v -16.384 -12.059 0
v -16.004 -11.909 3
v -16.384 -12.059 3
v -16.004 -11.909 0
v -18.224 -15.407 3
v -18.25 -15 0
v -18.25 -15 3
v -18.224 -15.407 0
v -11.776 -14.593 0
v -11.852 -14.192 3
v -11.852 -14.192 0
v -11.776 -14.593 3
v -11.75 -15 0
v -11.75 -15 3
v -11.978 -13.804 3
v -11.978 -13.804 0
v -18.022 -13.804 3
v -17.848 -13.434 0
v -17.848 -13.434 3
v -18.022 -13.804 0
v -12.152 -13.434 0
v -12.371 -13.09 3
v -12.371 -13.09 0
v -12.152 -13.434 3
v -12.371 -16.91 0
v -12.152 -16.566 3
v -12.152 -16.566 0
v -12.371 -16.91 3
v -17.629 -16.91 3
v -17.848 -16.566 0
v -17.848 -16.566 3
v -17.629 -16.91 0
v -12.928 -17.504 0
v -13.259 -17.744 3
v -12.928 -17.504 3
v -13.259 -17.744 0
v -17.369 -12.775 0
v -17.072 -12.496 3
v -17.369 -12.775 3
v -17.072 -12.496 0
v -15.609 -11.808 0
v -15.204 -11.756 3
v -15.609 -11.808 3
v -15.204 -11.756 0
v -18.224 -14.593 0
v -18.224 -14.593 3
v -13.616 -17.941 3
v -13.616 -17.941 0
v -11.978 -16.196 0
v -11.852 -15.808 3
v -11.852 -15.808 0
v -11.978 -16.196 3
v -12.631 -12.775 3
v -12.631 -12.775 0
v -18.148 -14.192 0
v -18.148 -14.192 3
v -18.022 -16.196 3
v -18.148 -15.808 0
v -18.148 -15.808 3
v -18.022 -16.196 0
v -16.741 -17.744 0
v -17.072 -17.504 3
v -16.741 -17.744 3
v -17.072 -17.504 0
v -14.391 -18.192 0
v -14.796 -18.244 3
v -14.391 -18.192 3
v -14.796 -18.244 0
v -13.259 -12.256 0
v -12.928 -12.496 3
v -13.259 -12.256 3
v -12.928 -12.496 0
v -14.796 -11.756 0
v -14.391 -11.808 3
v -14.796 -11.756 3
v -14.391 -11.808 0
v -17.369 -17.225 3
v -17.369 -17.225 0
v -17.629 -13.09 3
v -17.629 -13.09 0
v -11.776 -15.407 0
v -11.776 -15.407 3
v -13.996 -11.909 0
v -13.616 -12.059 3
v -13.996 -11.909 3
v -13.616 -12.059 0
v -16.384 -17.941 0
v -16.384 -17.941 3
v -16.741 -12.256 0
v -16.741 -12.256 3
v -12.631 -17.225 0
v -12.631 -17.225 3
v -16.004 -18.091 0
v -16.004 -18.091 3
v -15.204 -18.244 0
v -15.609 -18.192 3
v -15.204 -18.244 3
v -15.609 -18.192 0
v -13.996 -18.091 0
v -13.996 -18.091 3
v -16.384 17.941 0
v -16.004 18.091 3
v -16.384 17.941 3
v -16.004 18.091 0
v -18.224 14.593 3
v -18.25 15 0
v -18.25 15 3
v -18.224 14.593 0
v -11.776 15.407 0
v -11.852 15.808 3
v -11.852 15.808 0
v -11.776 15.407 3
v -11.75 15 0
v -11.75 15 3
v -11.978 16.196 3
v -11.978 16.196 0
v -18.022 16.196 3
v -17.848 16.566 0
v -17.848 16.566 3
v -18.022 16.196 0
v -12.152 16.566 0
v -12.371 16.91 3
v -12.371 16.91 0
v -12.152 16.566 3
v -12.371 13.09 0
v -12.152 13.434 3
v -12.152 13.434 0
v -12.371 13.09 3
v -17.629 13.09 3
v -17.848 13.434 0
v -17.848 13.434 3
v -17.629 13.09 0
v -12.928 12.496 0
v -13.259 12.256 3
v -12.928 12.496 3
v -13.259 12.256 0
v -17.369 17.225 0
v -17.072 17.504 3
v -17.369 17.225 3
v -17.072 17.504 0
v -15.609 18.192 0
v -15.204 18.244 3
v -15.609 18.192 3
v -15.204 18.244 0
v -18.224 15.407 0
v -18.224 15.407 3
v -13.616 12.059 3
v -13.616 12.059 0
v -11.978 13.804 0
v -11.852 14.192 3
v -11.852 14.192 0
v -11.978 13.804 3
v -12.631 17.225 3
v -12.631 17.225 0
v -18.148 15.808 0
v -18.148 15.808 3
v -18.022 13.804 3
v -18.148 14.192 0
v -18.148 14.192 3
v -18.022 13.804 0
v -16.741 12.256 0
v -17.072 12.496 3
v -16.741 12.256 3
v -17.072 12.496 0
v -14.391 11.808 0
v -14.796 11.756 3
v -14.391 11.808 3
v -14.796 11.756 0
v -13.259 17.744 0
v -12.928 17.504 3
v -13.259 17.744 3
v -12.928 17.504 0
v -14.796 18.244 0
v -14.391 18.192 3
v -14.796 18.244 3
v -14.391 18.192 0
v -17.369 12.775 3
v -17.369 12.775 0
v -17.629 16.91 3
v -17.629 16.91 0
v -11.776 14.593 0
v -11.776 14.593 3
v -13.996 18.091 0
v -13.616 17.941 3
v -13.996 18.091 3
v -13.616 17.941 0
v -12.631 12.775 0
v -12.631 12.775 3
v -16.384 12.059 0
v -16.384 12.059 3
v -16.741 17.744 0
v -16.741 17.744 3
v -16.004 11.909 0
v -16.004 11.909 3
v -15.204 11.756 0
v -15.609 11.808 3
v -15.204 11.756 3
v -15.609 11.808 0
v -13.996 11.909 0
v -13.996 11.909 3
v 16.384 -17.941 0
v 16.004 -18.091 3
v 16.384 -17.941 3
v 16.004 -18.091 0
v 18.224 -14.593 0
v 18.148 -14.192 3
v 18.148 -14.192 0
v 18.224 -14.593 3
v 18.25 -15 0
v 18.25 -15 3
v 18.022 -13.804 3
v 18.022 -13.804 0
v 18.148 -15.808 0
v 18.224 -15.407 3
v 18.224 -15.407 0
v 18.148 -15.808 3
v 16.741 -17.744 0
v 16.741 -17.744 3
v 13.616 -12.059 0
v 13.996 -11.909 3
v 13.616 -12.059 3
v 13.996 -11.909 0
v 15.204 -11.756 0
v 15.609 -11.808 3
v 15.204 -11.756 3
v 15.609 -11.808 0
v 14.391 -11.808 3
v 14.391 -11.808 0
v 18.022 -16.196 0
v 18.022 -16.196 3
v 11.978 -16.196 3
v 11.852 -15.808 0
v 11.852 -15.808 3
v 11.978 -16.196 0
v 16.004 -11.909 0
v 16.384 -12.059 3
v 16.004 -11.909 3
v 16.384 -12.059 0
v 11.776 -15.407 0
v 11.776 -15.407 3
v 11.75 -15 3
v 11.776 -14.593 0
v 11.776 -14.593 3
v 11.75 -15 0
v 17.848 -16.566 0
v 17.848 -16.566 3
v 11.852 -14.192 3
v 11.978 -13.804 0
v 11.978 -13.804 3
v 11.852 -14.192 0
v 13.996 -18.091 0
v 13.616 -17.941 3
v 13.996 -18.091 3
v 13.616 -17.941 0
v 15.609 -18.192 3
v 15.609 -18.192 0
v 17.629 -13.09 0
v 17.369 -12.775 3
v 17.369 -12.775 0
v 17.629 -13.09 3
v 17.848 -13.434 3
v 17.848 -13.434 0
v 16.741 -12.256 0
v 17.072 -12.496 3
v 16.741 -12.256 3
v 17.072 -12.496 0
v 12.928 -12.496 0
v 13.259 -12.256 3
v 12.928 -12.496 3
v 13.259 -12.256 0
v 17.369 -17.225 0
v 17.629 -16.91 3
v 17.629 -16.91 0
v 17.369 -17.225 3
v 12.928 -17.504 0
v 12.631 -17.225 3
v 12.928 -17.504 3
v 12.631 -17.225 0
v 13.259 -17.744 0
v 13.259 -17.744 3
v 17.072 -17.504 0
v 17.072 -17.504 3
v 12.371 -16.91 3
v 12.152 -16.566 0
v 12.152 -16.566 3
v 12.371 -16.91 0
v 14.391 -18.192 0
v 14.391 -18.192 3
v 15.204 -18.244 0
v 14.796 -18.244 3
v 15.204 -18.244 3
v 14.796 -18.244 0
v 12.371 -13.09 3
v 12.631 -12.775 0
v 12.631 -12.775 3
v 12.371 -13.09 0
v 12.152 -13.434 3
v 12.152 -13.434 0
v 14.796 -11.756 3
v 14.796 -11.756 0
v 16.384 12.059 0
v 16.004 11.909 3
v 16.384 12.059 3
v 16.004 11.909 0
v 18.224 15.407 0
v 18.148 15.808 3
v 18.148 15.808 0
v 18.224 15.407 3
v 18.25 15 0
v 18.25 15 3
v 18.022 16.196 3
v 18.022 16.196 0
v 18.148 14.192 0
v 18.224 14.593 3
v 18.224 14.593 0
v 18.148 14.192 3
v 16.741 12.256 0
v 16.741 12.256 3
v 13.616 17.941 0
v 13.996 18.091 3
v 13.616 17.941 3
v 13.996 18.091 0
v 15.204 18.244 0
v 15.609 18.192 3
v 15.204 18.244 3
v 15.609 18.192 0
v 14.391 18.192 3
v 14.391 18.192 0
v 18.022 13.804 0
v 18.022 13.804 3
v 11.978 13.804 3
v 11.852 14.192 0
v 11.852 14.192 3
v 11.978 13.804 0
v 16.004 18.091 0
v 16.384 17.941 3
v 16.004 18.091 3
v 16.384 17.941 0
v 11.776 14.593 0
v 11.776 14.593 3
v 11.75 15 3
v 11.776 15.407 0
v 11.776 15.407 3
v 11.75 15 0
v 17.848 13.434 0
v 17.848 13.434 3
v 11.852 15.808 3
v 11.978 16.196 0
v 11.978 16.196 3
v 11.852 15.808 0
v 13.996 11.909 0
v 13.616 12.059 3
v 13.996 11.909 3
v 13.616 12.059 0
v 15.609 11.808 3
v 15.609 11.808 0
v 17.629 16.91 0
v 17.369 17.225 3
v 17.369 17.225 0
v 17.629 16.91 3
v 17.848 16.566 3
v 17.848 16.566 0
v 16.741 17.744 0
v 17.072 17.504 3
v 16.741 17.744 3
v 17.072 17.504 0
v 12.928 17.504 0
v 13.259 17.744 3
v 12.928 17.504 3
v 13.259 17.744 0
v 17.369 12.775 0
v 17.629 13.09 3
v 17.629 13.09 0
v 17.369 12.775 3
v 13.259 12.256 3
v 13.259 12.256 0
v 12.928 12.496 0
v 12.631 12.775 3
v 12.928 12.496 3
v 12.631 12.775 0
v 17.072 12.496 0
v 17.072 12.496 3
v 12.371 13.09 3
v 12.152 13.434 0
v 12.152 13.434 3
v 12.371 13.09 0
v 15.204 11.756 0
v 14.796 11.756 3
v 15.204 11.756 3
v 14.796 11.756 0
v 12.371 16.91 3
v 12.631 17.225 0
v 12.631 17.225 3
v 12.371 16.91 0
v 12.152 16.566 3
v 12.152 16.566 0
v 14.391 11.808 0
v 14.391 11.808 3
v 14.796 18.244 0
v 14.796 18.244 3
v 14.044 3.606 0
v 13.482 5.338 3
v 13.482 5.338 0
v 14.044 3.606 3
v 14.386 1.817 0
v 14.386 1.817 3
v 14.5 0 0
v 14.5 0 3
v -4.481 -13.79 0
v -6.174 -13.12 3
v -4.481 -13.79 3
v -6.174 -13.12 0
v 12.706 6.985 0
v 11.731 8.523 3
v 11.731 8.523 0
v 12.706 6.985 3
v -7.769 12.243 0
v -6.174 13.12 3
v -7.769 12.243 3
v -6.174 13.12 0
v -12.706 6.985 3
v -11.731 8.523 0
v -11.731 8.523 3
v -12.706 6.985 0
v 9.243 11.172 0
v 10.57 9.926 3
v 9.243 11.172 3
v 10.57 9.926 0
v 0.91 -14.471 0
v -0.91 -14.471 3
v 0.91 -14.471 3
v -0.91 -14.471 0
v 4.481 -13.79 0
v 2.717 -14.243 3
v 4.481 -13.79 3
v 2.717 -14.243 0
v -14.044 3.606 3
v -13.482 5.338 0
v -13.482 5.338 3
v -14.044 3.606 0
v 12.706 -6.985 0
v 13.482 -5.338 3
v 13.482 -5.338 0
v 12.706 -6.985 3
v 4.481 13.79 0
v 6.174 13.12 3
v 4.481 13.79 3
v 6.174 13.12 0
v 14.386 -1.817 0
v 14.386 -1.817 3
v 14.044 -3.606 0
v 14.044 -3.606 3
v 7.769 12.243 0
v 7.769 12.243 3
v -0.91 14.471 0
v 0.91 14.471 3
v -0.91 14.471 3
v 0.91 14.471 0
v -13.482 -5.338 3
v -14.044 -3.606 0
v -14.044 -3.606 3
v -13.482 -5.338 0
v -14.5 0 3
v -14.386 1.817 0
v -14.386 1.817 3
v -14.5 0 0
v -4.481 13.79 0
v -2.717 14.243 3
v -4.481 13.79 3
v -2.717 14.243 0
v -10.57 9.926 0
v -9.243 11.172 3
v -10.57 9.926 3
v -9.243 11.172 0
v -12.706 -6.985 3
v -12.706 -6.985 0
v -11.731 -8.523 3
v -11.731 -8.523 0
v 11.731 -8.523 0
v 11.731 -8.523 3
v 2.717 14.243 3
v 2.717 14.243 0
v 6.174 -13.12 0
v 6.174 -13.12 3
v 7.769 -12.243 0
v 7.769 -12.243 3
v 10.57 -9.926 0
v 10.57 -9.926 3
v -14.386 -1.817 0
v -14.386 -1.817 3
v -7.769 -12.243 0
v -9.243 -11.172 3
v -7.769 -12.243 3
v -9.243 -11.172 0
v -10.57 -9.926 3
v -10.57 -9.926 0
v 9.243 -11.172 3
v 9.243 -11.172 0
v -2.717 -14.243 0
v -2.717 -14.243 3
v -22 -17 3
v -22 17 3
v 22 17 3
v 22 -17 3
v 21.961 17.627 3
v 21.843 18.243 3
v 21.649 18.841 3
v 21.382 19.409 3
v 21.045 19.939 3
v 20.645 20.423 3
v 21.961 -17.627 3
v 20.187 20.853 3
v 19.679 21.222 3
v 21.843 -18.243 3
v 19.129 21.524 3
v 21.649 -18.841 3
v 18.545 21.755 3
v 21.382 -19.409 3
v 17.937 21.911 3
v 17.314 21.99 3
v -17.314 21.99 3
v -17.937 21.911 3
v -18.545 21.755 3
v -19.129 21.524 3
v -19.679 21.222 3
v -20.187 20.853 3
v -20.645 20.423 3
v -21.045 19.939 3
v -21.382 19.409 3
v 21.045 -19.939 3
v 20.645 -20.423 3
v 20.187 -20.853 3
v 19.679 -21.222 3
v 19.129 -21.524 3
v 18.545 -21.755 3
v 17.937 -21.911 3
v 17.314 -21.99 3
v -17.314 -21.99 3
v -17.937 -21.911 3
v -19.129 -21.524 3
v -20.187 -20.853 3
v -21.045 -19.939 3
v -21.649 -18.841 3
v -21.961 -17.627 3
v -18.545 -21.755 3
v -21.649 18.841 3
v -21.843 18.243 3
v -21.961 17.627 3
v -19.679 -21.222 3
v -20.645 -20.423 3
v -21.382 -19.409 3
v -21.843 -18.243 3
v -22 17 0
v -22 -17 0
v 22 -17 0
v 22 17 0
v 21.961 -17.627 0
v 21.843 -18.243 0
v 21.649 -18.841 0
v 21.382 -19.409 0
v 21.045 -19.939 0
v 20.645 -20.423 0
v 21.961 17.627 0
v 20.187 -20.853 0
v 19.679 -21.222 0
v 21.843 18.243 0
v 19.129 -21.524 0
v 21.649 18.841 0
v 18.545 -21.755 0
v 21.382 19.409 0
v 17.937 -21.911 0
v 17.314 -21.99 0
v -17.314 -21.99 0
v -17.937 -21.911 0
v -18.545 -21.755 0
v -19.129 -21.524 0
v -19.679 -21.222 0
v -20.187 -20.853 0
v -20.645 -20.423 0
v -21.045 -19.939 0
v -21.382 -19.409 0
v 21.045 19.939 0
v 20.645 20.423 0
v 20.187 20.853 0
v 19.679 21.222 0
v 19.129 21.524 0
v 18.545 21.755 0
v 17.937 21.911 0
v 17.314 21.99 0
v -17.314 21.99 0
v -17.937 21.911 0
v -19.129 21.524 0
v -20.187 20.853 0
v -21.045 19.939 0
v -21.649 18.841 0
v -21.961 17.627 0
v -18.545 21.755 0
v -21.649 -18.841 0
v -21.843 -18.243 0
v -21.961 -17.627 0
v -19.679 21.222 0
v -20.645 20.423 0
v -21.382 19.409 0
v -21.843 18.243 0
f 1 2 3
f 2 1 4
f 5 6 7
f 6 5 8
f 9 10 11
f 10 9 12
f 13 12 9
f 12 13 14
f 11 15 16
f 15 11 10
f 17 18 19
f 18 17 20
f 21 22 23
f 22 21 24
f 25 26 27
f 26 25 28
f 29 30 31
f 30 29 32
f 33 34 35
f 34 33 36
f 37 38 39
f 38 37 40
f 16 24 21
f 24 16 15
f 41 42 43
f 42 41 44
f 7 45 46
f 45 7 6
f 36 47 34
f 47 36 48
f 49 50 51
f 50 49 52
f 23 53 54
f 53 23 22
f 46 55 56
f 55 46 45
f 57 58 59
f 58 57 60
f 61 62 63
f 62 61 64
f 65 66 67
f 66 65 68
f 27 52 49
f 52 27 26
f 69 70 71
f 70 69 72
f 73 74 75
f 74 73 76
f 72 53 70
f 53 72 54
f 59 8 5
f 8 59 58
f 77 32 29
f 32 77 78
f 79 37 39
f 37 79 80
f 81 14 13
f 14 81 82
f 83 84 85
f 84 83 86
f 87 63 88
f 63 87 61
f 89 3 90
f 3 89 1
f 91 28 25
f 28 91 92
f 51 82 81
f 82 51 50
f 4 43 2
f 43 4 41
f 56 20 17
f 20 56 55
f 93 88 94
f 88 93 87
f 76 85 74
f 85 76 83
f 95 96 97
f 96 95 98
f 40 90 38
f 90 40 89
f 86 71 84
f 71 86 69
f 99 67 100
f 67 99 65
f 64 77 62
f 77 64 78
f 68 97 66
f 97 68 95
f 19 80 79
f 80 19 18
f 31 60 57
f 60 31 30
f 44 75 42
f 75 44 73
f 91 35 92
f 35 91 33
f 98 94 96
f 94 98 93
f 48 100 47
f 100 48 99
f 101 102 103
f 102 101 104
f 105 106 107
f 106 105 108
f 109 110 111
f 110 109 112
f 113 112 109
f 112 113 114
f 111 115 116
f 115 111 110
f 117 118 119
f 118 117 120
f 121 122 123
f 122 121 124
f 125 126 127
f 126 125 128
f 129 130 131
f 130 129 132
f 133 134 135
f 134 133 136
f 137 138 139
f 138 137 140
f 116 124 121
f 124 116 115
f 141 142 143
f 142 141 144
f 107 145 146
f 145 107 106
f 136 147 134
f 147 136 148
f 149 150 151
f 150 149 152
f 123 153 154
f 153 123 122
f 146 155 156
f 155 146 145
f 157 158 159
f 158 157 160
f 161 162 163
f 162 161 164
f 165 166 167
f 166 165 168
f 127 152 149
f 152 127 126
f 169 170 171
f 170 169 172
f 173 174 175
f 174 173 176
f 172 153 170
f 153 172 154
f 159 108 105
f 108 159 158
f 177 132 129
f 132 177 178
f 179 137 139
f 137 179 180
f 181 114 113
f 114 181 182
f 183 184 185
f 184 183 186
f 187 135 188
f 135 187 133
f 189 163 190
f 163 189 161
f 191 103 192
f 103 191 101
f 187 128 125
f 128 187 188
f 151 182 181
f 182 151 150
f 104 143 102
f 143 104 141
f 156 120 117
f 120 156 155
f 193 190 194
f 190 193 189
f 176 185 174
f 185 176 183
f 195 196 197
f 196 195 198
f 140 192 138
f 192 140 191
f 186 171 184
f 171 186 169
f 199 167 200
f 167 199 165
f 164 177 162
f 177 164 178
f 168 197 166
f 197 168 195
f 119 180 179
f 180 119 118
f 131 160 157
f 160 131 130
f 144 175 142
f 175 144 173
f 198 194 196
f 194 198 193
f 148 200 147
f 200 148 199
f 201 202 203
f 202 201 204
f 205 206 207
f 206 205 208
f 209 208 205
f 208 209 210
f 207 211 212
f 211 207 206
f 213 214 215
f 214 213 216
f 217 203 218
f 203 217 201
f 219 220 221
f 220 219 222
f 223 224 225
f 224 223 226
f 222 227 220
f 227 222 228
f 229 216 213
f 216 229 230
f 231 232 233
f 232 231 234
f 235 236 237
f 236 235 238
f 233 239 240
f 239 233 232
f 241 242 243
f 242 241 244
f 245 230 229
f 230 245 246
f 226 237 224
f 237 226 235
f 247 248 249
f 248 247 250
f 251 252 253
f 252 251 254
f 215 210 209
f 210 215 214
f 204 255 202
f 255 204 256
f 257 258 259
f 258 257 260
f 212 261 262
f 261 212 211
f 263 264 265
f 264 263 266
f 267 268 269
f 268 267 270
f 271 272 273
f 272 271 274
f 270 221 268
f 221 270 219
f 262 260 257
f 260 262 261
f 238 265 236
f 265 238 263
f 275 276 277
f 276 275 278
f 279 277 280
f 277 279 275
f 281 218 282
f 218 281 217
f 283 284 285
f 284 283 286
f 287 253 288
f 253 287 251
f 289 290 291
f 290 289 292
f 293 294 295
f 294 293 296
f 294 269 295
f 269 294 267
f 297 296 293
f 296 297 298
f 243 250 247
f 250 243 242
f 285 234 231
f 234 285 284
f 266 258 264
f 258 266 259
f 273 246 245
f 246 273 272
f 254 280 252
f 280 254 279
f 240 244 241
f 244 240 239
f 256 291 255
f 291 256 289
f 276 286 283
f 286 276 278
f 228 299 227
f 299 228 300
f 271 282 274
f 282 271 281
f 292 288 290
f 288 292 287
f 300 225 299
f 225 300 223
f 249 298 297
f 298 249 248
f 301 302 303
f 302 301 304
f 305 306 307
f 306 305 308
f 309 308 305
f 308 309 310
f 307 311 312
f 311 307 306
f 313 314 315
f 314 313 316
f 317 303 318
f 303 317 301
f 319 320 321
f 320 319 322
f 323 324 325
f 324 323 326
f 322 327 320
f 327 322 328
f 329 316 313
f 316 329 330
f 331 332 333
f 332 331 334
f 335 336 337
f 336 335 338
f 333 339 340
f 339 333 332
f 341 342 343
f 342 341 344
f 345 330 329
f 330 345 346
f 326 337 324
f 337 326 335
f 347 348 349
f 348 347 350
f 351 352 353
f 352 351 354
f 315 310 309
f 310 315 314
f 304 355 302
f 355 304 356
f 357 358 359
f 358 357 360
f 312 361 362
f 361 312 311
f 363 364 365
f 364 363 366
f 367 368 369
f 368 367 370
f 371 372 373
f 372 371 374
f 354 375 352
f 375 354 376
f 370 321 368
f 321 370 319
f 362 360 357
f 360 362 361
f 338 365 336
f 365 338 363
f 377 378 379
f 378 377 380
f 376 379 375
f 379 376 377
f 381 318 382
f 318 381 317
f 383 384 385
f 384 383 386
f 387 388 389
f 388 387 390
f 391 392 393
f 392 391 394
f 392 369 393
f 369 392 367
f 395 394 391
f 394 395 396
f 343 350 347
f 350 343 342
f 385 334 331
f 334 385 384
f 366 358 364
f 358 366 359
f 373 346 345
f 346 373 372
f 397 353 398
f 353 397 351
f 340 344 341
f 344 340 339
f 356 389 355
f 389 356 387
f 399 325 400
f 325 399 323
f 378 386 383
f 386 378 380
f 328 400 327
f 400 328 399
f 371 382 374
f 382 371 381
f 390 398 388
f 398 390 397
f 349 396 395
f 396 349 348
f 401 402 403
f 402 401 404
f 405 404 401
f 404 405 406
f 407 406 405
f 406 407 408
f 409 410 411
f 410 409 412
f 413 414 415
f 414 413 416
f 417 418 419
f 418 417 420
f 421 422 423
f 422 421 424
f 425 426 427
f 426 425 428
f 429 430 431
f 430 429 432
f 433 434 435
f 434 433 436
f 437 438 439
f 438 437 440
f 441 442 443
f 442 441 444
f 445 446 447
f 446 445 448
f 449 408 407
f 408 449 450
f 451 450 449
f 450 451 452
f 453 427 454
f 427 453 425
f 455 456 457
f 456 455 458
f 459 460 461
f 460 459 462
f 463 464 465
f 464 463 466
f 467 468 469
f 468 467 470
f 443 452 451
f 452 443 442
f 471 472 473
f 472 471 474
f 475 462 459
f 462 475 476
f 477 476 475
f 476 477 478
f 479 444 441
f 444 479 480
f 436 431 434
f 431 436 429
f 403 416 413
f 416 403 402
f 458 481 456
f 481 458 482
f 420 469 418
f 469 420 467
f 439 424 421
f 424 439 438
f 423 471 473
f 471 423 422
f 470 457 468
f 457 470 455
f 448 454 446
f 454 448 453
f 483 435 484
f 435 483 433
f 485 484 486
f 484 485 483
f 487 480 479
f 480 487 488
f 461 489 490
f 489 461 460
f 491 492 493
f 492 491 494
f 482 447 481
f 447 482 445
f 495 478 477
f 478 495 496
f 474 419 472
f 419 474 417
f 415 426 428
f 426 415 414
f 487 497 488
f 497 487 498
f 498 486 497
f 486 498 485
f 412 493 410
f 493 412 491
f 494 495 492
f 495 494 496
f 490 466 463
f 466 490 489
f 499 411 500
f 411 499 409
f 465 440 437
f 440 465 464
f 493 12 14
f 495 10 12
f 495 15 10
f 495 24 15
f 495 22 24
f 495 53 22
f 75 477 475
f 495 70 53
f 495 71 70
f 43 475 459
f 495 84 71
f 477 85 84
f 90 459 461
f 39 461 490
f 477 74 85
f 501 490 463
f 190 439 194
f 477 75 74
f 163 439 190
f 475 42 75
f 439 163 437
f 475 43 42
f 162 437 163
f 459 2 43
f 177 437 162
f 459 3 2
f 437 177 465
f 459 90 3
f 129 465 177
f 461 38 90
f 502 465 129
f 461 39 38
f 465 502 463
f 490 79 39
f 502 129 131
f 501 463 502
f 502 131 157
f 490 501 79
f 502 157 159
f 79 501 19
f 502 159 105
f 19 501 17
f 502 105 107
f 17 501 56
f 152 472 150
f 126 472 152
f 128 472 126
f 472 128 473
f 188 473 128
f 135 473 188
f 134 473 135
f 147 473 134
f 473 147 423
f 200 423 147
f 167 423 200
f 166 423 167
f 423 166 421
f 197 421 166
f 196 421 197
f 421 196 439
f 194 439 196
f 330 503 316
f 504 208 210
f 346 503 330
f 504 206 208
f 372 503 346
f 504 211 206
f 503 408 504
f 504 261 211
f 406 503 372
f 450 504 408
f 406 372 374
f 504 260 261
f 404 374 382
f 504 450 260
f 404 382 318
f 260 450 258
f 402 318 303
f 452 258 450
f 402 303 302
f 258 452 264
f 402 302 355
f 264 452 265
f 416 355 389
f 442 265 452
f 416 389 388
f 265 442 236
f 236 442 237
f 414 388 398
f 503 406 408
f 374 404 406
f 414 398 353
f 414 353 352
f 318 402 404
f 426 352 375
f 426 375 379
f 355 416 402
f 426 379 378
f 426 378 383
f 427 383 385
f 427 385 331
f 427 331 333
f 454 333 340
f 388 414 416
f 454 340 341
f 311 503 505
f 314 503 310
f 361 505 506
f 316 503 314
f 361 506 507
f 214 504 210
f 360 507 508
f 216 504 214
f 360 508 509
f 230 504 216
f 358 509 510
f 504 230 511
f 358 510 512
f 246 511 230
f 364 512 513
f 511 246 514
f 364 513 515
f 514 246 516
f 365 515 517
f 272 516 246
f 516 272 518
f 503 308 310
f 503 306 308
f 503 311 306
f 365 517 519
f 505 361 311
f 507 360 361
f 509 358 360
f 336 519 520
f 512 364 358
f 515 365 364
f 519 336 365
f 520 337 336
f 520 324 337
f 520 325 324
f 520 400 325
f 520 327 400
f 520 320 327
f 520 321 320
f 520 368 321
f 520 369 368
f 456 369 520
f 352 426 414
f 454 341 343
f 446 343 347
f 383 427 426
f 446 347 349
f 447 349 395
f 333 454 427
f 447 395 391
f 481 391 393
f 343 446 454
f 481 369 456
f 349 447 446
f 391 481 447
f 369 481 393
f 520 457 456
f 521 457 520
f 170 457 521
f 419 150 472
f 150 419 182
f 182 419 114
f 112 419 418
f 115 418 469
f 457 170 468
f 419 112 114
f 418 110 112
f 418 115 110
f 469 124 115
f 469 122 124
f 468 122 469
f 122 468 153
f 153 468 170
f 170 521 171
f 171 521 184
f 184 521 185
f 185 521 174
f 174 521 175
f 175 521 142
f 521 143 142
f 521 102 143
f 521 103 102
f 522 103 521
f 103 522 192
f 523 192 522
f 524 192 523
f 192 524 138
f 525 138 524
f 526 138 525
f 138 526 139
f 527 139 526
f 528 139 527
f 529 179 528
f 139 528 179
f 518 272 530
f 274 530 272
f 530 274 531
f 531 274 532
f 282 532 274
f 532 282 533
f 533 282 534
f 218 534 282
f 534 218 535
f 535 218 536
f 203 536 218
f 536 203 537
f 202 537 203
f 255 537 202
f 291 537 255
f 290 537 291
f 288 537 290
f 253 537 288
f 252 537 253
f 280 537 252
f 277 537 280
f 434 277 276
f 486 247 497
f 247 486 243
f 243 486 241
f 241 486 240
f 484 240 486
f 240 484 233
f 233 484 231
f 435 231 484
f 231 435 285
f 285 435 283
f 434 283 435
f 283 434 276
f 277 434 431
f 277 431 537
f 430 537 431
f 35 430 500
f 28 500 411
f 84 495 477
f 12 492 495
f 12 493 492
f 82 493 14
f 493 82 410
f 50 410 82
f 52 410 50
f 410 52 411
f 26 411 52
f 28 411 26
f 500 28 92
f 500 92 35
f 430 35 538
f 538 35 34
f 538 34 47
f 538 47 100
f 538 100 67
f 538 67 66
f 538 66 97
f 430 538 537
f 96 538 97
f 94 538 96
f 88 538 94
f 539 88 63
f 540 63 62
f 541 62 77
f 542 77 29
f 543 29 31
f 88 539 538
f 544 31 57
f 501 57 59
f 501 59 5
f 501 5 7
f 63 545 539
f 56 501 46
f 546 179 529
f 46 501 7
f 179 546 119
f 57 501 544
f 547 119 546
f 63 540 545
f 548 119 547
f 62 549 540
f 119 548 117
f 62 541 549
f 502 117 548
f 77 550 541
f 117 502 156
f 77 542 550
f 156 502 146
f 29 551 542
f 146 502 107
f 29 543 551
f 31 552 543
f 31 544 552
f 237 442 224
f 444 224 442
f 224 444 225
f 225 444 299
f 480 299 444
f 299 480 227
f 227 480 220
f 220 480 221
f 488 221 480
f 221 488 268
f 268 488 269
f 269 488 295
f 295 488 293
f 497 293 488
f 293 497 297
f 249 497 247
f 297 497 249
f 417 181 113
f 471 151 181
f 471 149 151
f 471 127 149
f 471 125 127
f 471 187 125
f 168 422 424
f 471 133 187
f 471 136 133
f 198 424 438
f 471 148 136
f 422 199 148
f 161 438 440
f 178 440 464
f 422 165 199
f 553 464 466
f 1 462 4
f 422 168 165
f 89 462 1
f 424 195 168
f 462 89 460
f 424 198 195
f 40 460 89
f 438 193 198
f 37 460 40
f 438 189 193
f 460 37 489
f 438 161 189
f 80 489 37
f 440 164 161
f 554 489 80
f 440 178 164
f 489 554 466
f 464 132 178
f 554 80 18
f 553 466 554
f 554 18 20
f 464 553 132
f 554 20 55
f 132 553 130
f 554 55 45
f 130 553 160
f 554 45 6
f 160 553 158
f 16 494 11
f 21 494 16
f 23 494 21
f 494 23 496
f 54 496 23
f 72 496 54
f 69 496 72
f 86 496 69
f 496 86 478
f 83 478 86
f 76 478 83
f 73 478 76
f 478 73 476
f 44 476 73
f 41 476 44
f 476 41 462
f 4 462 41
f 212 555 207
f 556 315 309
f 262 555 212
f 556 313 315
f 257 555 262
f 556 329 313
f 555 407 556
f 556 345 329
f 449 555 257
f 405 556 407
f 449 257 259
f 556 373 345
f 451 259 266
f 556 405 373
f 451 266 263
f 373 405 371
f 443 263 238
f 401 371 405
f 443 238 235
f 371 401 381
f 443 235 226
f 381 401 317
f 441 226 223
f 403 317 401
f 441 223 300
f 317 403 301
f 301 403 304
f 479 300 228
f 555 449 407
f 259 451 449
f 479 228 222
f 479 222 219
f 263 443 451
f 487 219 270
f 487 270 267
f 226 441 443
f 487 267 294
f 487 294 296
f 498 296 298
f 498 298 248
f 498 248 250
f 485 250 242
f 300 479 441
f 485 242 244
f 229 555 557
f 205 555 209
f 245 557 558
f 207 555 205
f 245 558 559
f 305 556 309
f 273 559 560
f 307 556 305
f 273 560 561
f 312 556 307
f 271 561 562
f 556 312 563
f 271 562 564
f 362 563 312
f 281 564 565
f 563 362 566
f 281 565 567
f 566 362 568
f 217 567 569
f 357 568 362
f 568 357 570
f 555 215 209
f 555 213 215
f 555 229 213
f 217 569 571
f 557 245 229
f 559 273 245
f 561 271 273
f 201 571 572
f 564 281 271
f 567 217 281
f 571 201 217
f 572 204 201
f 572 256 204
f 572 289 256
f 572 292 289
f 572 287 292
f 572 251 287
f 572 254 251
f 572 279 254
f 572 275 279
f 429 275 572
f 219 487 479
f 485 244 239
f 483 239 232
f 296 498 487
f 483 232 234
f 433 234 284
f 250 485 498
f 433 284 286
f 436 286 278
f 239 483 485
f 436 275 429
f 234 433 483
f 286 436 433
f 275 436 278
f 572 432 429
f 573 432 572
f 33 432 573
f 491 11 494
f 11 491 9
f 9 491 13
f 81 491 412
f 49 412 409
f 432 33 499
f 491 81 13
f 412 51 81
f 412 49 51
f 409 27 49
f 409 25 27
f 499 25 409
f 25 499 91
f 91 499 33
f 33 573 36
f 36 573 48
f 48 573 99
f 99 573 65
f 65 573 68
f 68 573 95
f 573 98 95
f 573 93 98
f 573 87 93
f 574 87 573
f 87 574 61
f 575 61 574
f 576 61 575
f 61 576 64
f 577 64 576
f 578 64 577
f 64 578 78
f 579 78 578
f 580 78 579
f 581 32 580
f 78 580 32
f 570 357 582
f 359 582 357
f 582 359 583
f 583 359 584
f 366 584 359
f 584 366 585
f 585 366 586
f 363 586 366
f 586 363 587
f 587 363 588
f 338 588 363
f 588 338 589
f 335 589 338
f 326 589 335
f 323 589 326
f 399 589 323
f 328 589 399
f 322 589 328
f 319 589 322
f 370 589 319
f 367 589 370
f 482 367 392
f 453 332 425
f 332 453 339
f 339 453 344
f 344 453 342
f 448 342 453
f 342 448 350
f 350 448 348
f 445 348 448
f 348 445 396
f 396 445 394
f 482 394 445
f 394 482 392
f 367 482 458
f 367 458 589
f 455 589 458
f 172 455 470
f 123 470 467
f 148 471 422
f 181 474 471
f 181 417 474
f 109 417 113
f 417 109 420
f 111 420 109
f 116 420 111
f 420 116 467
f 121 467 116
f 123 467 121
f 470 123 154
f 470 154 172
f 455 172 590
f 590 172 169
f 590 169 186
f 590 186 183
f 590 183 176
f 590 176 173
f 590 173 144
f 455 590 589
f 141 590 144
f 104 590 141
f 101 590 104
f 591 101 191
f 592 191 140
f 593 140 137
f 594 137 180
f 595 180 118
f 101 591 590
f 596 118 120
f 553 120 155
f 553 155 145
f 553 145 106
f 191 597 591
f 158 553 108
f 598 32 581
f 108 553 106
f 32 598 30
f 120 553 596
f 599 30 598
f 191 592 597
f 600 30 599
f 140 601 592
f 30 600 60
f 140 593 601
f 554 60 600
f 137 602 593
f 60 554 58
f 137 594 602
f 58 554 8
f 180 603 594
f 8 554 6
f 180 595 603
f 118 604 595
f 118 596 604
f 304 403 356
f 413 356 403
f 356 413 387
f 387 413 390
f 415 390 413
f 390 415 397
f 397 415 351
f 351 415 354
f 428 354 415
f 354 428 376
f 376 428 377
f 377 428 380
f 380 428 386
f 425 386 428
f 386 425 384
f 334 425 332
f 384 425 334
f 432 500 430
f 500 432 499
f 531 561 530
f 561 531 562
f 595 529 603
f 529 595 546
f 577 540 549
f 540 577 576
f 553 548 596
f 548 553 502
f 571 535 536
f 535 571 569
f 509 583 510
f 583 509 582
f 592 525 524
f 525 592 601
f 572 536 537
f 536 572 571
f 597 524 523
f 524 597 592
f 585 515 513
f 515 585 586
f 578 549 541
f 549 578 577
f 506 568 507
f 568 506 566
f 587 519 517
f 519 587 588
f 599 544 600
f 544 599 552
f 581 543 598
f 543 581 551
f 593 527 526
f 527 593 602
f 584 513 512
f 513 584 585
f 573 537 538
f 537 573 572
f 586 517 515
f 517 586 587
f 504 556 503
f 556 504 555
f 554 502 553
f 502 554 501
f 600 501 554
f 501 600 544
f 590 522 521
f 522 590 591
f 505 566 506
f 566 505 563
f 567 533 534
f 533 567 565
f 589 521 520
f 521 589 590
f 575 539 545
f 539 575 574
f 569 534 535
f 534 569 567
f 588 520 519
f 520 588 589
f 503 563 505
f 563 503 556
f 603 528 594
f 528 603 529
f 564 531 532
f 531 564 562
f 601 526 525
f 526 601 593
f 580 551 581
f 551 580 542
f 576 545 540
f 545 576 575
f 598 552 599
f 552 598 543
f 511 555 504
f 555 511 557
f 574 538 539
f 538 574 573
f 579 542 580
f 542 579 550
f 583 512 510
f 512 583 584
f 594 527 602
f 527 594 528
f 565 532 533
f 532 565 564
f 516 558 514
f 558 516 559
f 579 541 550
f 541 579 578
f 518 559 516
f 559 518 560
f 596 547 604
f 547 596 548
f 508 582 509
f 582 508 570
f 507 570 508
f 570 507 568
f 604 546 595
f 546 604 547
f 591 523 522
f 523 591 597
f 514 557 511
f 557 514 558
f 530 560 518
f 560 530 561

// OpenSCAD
$fn = 50;

difference() {
	union() {
		hull() {
			translate(v = [-17.0, 17.0, 0]) {
				cylinder(h = 3, r = 5);
			}
			translate(v = [17.0, 17.0, 0]) {
				cylinder(h = 3, r = 5);
			}
			translate(v = [-17.0, -17.0, 0]) {
				cylinder(h = 3, r = 5);
			}
			translate(v = [17.0, -17.0, 0]) {
				cylinder(h = 3, r = 5);
			}
		}
	}
	union() {
		translate(v = [-15.0, -15.0, -100.0]) {
			cylinder(h = 200, r = 3.25);
		}
		translate(v = [-15.0, 15.0, -100.0]) {
			cylinder(h = 200, r = 3.25);
		}
		translate(v = [15.0, -15.0, -100.0]) {
			cylinder(h = 200, r = 3.25);
		}
		translate(v = [15.0, 15.0, -100.0]) {
			cylinder(h = 200, r = 3.25);
		}
		translate(v = [-15.0, -15.0, -100.0]) {
			cylinder(h = 200, r = 1.8);
		}
		translate(v = [-15.0, 15.0, -100.0]) {
			cylinder(h = 200, r = 1.8);
		}
		translate(v = [15.0, -15.0, -100.0]) {
			cylinder(h = 200, r = 1.8);
		}
		translate(v = [15.0, 15.0, -100.0]) {
			cylinder(h = 200, r = 1.8);
		}
		cylinder(h = 3, r = 14.5);
	}
}
